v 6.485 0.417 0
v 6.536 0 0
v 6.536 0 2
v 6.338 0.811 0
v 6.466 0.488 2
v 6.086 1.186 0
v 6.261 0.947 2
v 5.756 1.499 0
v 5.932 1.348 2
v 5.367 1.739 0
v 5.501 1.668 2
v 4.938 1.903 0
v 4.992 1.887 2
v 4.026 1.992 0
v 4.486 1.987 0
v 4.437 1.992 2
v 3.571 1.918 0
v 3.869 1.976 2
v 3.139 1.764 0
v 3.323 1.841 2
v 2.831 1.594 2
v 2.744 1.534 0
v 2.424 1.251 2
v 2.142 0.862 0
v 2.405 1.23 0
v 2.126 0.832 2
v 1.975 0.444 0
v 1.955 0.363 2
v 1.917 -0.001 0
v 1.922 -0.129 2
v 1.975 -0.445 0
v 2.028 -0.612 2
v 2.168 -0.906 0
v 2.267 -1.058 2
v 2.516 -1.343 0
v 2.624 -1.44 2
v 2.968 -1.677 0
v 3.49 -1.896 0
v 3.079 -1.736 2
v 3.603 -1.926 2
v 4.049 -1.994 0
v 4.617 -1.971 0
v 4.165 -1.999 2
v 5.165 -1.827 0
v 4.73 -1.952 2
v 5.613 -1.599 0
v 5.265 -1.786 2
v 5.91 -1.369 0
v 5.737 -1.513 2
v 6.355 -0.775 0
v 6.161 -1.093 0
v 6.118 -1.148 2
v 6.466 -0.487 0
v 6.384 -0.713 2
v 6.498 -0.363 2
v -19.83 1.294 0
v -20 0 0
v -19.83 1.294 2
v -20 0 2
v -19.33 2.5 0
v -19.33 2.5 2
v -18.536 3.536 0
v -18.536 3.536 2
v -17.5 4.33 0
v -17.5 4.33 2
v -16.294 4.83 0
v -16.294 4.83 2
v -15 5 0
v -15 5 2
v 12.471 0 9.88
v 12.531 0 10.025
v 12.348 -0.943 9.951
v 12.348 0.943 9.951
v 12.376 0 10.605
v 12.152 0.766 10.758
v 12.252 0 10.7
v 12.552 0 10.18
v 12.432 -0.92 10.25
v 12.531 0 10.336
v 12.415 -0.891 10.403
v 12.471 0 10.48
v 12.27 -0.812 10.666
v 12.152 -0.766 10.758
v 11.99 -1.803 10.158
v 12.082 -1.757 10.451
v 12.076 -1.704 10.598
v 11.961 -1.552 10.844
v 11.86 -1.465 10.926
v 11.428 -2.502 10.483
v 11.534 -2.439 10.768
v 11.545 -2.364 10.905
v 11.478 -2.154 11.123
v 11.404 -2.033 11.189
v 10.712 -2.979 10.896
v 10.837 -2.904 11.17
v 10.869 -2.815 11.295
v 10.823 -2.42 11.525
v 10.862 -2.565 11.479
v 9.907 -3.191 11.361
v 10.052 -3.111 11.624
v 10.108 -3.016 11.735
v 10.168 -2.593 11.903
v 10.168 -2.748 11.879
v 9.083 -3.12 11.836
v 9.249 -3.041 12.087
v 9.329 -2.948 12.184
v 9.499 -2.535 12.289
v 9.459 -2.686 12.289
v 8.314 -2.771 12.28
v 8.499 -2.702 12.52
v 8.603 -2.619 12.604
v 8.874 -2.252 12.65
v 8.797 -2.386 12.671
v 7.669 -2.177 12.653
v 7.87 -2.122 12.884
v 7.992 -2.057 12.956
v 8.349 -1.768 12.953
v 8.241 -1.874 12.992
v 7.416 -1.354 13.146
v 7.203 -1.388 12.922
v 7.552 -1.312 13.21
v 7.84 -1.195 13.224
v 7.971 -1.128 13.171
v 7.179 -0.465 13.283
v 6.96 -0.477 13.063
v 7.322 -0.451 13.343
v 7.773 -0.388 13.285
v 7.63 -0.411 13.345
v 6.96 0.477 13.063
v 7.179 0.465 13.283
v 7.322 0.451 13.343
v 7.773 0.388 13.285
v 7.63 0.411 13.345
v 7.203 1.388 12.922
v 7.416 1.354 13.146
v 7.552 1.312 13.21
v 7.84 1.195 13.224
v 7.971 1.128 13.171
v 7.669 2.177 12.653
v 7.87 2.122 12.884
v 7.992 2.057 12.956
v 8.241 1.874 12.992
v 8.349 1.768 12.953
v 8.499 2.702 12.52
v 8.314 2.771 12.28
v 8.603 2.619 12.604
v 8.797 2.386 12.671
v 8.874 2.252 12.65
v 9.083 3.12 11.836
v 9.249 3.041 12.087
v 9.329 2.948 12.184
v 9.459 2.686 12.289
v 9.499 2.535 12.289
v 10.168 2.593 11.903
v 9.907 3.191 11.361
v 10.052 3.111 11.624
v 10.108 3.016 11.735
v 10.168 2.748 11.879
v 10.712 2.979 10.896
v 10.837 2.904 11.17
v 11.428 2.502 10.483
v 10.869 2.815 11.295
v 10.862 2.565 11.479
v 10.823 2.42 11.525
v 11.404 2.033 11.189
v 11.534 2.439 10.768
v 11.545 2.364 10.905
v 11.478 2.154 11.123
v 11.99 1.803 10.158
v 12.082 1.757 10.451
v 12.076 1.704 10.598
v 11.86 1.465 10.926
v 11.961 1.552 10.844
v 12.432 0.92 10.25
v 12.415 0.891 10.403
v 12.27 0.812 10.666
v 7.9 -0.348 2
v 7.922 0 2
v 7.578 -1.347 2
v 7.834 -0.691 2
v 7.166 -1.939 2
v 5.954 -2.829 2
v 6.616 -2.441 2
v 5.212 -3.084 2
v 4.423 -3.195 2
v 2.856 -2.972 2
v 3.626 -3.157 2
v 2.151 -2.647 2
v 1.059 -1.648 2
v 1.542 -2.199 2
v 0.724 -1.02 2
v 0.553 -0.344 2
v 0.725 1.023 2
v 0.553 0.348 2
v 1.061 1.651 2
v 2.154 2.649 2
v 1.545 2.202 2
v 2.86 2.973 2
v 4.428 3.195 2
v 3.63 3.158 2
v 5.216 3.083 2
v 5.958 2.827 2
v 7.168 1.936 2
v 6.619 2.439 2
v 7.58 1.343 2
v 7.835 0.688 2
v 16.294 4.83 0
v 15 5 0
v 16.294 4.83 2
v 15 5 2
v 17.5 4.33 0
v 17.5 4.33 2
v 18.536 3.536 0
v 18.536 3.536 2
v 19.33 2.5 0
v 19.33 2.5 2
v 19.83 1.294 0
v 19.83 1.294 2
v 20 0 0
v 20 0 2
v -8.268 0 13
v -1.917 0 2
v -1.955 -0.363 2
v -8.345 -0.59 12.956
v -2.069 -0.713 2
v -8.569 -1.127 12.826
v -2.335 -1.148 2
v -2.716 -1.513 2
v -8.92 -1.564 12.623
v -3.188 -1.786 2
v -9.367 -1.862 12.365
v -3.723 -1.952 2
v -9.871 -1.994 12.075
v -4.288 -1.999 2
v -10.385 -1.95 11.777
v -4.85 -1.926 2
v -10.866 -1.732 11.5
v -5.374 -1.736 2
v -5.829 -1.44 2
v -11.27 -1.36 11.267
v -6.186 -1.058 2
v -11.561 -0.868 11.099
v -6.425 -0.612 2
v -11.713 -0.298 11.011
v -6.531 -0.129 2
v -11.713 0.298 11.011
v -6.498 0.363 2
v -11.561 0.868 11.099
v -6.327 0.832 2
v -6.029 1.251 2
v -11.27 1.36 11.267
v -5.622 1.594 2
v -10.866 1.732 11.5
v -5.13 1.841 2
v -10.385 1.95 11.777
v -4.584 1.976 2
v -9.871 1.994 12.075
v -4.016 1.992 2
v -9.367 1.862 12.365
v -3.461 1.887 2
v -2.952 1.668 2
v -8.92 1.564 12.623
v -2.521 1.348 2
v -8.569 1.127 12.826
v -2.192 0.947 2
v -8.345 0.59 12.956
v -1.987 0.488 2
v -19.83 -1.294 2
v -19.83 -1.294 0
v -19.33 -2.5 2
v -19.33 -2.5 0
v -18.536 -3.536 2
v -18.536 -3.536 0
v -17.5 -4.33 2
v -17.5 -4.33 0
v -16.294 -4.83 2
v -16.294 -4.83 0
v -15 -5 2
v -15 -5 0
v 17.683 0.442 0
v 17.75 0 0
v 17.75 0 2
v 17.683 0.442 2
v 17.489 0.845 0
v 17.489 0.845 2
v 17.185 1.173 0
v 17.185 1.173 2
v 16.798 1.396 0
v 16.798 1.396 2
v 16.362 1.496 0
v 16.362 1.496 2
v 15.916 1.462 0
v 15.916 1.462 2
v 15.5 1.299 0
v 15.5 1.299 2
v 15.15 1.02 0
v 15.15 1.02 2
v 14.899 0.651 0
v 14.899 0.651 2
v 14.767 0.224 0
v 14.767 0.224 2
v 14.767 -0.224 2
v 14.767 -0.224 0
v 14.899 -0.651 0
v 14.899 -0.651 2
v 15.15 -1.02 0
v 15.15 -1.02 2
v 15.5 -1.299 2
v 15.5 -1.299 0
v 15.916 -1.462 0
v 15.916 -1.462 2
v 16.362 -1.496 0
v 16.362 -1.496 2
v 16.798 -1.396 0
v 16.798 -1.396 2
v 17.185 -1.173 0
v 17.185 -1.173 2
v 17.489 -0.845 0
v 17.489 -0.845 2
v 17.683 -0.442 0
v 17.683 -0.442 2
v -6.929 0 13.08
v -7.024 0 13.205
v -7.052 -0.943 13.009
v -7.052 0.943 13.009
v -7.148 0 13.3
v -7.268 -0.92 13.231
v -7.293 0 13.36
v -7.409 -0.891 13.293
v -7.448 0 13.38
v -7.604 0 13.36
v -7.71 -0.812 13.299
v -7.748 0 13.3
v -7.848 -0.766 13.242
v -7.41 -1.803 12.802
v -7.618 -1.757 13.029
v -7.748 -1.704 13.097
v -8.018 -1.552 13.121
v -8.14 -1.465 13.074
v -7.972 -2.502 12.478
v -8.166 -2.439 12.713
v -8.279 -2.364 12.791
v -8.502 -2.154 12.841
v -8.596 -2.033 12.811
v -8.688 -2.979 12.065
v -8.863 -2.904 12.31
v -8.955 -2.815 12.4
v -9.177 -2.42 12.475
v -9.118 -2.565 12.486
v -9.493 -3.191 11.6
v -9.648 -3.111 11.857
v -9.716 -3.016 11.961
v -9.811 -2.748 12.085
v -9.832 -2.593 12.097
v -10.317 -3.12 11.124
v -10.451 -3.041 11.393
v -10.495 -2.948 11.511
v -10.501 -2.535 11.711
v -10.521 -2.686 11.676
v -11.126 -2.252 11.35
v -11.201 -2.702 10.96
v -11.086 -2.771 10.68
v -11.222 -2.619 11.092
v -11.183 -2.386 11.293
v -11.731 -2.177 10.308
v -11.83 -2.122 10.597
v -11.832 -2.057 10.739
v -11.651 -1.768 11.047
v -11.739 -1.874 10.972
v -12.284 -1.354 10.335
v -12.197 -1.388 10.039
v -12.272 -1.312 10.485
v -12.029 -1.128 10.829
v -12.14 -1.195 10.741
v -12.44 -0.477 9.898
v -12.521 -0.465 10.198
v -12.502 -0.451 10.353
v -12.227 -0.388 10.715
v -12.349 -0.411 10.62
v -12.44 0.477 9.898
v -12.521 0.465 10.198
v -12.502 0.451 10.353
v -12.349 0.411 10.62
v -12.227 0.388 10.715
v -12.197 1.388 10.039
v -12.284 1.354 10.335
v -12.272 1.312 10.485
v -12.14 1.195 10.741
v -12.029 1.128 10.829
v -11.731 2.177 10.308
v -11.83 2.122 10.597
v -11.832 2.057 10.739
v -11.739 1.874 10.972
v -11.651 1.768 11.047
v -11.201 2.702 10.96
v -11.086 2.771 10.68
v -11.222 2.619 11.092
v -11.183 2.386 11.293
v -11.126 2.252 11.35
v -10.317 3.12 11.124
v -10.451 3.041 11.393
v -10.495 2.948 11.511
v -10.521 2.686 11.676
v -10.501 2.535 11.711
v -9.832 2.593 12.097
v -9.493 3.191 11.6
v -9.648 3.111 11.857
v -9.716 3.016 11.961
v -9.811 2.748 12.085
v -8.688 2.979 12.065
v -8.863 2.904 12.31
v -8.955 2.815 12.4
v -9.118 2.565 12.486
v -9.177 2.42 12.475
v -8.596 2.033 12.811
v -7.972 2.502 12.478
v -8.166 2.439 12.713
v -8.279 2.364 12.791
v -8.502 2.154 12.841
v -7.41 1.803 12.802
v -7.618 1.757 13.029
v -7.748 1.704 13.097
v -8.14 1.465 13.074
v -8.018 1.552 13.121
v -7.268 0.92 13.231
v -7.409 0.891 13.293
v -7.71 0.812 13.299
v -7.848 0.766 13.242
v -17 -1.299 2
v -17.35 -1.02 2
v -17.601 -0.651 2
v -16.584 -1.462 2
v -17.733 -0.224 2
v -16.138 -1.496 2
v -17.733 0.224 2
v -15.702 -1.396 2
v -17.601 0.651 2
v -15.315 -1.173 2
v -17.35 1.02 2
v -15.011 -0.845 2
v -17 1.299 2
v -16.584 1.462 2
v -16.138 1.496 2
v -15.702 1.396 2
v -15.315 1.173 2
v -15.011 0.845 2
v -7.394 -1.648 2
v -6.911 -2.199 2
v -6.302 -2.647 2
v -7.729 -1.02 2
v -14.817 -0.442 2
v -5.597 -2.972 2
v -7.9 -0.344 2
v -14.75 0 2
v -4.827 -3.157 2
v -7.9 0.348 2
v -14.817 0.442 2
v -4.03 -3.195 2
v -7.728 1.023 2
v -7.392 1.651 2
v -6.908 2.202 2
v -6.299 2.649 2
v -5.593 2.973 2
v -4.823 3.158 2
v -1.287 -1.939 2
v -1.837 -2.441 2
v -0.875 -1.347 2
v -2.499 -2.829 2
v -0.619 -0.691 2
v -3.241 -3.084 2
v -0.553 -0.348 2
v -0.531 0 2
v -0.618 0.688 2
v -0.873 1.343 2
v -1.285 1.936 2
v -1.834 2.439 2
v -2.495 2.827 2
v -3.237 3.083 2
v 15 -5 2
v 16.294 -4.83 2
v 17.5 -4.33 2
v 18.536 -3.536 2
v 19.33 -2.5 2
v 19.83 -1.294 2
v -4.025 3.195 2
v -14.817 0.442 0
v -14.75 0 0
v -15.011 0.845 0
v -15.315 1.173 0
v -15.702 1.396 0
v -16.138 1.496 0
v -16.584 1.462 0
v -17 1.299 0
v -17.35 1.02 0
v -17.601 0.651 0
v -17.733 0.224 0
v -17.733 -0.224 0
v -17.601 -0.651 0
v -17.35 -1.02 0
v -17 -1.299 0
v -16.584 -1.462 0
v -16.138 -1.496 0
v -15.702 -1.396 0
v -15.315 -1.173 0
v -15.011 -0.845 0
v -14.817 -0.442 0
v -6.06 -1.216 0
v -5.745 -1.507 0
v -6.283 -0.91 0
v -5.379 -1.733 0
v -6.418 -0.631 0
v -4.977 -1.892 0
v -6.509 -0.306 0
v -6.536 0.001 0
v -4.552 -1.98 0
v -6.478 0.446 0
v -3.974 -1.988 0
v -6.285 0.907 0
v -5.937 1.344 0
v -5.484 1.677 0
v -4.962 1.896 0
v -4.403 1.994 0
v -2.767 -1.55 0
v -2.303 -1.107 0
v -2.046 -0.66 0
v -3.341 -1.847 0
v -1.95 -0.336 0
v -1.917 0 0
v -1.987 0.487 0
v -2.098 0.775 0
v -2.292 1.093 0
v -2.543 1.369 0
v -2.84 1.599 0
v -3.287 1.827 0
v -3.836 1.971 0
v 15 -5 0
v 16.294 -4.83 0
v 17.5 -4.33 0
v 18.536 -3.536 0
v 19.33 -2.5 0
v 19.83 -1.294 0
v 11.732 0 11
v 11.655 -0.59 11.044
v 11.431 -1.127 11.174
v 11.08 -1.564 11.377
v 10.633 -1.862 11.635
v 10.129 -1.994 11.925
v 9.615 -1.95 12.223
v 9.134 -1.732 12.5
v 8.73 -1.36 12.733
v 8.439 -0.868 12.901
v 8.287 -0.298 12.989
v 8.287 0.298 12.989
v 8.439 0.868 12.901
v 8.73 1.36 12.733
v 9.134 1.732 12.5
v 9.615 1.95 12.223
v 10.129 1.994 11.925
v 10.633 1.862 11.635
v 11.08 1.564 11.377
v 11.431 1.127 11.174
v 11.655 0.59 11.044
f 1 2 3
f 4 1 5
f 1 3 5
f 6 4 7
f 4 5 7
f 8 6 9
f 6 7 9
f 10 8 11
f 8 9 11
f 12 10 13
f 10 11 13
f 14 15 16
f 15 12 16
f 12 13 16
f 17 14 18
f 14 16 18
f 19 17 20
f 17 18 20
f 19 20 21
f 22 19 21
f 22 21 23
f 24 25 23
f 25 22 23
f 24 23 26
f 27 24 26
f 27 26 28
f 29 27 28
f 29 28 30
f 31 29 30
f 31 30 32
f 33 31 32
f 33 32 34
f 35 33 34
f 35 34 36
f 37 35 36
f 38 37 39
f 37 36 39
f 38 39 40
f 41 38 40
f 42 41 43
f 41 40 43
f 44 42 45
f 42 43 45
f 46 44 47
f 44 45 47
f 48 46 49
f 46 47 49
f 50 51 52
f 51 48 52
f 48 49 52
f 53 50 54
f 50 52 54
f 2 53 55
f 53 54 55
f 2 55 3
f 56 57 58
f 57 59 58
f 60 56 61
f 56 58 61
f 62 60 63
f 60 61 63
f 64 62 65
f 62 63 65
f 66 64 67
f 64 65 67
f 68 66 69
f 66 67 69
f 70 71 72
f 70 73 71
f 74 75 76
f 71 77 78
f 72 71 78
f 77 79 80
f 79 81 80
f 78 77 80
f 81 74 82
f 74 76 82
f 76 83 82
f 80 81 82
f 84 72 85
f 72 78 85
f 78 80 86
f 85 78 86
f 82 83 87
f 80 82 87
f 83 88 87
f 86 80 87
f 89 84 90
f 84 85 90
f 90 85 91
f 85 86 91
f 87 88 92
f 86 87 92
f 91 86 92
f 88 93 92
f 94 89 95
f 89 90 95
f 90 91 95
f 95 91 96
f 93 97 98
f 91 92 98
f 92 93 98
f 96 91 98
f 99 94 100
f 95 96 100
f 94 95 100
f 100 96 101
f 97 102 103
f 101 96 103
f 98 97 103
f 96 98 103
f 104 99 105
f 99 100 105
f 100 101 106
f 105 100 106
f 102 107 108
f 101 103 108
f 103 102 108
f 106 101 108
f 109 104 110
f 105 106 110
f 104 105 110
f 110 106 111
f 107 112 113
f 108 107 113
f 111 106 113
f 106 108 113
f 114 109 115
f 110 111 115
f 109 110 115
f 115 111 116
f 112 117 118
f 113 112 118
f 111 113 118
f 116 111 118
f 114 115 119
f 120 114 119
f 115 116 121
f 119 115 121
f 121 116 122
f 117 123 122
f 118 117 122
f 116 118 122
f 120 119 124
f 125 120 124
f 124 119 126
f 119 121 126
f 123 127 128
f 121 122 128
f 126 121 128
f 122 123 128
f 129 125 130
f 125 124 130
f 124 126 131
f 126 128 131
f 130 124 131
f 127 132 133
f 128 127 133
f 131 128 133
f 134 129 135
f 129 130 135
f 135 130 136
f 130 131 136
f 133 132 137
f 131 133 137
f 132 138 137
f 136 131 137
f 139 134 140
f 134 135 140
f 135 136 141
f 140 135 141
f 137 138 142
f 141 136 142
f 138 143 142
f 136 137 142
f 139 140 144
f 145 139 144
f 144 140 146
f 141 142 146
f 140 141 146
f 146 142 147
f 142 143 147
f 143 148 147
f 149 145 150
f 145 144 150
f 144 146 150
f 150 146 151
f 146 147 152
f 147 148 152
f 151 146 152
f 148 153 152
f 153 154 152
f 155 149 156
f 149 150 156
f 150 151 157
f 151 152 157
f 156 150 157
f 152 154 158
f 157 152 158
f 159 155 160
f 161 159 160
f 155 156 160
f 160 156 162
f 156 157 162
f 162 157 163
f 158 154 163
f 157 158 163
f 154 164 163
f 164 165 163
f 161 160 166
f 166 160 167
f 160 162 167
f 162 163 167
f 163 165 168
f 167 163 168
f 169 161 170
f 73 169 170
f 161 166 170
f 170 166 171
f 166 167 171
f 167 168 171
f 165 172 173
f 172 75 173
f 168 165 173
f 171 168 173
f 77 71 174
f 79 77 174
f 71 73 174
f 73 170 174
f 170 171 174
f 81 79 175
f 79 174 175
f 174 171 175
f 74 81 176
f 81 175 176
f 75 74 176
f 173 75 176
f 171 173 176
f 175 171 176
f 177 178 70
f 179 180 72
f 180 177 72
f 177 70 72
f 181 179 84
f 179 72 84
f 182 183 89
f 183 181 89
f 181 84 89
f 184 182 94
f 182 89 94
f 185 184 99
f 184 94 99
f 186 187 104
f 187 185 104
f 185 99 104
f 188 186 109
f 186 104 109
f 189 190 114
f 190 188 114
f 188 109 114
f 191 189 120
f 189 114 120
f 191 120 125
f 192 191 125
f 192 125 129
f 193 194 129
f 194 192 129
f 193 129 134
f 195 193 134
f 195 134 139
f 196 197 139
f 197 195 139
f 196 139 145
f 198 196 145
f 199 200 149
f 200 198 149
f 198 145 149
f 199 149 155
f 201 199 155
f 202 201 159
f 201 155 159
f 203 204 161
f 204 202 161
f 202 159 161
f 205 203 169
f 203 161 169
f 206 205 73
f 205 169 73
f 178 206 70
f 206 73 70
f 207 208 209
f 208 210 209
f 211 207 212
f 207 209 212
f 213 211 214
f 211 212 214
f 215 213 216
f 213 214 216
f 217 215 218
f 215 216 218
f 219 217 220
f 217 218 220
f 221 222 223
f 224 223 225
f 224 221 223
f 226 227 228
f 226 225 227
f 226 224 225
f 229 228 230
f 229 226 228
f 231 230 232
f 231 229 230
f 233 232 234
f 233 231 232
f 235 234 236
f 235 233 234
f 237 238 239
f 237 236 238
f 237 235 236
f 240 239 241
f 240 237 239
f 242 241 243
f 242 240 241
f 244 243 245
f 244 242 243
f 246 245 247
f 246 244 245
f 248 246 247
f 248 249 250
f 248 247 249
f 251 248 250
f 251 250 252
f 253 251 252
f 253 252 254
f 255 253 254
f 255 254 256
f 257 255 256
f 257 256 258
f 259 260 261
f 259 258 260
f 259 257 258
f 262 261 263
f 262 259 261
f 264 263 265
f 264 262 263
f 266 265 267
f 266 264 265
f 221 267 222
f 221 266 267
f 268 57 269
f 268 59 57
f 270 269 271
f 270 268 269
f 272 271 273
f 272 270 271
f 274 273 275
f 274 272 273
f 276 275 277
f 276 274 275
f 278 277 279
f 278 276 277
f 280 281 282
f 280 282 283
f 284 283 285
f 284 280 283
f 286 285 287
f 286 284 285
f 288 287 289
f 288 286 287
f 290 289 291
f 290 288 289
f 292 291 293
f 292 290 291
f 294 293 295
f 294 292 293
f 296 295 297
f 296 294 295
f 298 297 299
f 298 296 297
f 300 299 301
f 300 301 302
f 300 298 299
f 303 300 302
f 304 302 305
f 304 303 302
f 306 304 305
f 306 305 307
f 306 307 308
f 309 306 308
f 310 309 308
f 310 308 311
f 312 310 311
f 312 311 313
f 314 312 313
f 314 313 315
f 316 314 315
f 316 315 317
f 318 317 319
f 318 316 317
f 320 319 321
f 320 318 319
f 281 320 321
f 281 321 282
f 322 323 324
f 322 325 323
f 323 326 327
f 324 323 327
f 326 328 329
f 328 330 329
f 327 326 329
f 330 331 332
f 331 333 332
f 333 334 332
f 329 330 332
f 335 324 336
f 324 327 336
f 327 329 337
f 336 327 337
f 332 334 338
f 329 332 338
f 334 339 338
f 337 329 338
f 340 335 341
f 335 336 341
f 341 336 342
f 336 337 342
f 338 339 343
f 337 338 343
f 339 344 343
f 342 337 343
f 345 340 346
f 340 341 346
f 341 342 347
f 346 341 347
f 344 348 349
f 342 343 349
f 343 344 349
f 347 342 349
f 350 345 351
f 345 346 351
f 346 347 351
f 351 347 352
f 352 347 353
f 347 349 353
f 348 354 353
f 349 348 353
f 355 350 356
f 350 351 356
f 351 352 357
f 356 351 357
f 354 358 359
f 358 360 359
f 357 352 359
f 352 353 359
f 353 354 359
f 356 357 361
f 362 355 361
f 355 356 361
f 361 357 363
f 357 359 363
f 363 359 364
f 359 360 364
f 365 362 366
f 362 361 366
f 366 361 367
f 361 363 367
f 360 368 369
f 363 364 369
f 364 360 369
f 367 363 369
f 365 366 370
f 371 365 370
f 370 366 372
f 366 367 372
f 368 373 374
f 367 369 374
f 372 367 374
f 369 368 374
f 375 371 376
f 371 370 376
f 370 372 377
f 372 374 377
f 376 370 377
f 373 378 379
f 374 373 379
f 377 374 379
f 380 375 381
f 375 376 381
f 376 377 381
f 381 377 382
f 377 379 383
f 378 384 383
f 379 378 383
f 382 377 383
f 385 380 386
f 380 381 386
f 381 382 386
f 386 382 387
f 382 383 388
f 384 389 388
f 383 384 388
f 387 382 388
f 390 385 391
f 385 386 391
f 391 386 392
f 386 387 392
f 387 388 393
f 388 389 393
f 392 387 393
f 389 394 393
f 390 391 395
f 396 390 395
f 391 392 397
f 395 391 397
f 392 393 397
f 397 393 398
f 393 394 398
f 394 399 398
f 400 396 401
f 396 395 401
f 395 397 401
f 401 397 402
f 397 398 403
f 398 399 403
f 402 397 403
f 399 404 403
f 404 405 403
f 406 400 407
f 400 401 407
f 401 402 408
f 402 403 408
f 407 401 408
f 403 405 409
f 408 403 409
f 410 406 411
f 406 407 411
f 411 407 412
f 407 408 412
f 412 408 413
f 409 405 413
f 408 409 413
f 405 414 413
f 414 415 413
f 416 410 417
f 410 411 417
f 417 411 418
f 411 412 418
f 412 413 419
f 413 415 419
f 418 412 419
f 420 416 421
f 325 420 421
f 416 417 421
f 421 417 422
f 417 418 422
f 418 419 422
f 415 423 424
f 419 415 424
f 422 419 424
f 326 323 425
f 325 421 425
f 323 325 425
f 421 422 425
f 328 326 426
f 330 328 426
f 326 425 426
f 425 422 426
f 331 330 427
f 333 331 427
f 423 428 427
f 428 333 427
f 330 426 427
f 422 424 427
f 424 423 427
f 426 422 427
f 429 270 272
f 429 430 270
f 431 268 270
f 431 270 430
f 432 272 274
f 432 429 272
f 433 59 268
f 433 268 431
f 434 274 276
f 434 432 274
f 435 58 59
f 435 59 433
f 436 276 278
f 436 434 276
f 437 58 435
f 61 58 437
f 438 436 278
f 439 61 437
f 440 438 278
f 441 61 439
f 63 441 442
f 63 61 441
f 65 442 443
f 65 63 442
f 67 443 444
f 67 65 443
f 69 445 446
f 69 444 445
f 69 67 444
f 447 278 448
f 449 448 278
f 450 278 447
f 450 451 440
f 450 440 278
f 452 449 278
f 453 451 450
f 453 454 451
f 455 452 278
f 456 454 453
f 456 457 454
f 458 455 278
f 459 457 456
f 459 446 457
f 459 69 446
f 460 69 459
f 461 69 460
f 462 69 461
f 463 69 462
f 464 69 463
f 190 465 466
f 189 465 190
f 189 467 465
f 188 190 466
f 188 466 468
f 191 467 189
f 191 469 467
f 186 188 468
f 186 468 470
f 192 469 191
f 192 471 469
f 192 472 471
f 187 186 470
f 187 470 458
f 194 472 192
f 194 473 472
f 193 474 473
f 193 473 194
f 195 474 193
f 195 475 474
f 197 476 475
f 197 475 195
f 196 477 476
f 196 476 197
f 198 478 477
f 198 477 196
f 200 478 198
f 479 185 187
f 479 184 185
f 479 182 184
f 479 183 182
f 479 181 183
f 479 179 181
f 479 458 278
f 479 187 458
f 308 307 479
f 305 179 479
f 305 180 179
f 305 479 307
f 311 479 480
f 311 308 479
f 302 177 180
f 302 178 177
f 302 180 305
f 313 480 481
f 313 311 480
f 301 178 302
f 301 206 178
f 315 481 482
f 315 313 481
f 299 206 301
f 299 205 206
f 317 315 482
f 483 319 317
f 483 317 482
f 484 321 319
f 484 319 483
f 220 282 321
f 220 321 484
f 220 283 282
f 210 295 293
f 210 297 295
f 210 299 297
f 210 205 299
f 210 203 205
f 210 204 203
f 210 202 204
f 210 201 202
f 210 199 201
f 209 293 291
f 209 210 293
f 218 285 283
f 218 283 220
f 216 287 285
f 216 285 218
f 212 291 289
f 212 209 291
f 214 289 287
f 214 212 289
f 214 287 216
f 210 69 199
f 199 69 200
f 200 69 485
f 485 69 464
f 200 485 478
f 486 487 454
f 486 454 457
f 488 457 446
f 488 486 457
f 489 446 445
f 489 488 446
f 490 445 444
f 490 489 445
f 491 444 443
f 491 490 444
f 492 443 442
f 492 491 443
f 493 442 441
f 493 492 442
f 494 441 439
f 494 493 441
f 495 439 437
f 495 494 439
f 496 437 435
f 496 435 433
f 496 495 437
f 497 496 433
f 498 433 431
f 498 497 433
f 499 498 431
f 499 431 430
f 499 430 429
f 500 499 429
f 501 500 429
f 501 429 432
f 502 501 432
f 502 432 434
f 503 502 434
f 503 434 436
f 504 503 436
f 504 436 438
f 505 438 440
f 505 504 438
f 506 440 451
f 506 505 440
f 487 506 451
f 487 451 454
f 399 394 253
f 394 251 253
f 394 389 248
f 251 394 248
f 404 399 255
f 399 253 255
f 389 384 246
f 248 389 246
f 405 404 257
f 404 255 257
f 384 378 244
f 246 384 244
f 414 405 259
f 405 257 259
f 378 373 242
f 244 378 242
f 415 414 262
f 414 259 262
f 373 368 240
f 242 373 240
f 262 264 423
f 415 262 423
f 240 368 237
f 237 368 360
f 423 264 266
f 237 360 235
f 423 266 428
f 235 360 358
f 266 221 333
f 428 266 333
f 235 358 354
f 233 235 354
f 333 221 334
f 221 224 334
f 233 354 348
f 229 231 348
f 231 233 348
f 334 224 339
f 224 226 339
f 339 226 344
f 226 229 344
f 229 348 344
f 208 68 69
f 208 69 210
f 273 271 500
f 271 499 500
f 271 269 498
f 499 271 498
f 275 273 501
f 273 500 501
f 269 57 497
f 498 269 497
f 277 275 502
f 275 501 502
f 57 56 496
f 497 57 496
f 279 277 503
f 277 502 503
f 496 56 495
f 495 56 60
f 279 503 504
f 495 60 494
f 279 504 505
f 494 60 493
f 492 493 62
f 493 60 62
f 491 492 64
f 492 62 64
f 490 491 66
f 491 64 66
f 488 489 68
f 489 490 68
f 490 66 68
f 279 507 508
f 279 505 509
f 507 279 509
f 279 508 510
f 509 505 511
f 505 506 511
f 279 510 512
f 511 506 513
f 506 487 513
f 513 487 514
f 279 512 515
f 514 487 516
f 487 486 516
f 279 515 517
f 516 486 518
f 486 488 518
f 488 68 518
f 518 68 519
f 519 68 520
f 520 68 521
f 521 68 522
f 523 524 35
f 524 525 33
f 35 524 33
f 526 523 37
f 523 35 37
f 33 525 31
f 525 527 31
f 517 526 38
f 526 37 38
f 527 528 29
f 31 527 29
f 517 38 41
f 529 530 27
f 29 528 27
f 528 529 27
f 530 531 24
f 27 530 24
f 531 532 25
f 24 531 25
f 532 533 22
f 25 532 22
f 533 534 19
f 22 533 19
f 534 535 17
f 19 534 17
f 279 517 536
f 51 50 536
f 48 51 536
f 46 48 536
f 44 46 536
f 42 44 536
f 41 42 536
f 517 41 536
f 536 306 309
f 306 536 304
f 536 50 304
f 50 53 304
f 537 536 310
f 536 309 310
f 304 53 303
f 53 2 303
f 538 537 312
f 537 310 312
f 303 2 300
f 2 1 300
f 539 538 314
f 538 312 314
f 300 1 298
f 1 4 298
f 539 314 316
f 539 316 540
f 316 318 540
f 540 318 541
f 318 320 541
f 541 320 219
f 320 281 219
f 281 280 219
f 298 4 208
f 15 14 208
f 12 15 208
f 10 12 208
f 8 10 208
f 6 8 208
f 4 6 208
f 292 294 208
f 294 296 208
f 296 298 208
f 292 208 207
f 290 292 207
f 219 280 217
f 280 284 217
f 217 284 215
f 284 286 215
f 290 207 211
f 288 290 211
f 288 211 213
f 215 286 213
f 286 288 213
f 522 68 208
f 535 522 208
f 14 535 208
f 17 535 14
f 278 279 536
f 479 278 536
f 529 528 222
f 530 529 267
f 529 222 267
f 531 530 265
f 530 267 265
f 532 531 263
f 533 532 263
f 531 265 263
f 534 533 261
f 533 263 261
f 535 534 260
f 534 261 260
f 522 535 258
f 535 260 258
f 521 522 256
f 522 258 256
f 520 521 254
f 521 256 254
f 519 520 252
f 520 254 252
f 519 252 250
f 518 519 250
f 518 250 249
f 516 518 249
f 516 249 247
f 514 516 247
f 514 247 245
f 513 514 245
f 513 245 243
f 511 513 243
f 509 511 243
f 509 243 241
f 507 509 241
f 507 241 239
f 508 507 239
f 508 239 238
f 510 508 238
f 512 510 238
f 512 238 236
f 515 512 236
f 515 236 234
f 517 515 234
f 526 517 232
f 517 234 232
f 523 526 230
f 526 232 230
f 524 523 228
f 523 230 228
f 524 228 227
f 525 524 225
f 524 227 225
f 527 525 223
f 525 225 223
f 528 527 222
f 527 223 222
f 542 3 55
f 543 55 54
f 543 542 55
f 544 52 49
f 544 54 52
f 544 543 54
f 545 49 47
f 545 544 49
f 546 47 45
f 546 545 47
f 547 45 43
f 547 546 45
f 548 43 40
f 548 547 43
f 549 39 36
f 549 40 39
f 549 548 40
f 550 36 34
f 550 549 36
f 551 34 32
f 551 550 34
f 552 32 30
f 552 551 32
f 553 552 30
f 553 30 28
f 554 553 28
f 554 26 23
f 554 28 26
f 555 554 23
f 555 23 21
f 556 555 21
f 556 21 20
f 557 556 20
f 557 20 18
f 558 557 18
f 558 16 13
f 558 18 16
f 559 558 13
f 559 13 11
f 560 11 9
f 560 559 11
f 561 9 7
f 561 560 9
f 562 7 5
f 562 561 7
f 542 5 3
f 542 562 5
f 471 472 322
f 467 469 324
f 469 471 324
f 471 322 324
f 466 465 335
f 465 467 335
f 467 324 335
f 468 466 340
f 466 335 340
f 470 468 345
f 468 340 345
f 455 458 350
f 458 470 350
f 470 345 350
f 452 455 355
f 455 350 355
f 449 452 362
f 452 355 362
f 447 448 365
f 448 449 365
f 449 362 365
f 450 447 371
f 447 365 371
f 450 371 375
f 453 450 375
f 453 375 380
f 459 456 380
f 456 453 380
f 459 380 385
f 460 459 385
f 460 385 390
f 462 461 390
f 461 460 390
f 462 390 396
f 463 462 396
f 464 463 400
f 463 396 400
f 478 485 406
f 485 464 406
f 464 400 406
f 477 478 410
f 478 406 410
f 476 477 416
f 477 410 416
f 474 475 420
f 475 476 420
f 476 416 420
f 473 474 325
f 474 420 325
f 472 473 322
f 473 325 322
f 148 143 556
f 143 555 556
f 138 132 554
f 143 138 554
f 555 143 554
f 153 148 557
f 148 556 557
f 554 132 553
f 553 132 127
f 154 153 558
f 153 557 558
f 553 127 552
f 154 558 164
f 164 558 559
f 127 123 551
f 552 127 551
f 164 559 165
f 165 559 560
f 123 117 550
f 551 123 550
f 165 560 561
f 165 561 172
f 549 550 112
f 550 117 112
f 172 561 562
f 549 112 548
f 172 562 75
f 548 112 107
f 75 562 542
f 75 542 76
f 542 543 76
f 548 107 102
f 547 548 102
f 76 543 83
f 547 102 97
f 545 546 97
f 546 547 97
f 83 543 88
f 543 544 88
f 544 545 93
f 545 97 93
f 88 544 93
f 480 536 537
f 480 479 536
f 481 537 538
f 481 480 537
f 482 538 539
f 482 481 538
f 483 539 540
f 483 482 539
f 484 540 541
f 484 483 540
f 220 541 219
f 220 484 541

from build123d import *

# Parameters (mm, degrees)
F0_W      = 40
F0_H      = 10
F0_R      = 1.5
F1_DEPTH  = 2
F7_R      = 3.2
F7_R_2    = 2
F9_R      = 3.2
F9_R_2    = 2
F11_R     = 4.99999
F12_DEPTH = 2.001
F13_DEPTH = 2.0010001
F14_R     = 0.6


# Not quite as in the source:
# - a fillet or chamfer is up to 0.001 mm smaller than in the source, because OpenCascade refuses the exact size


with BuildPart() as f1:
    # F0 (on Top) → F1 (new body)
    with BuildSketch(Plane.XY):
        Rectangle(F0_W, F0_H)
        with Locations((-16.25, 0)):
            Circle(F0_R, mode=Mode.SUBTRACT)
        with Locations((16.25, 0)):
            Circle(F0_R, mode=Mode.SUBTRACT)
    extrude(amount=F1_DEPTH)

    # F7 (on line) → F8 (join, up to the next surface of F1)
    with BuildSketch(Plane(origin=(7.6961524227, 0, 13.3301270189), x_dir=(0.8660254038, 0, -0.5), z_dir=(-0.5, 0, -0.8660254038))):
        with Locations((2.6602540378, 0)):
            Circle(F7_R)
        with Locations((2.6602540378, 0)):
            Circle(F7_R_2, mode=Mode.SUBTRACT)
    extrude(until=Until.NEXT)

    # F9 (on line) → F10 (join, up to the next surface of F1)
    with BuildSketch(Plane(origin=(-7.6961524227, 0, 13.3301270189), x_dir=(0.8660254038, 0, 0.5), z_dir=(0.5, 0, -0.8660254038))):
        with Locations((-2.6602540378, 0)):
            Circle(F9_R)
        with Locations((-2.6602540378, 0)):
            Circle(F9_R_2, mode=Mode.SUBTRACT)
    extrude(until=Until.NEXT)

    # F11 (radius 5 in the source; OpenCascade refuses exactly that, so slightly less here)
    f11_edges = [f1.edges().sort_by_distance(p)[0] for p in [
        (-20, -5, 1),
        (20, -5, 1),
        (20, 5, 1),
        (-20, 5, 1),
    ]]
    fillet(f11_edges, radius=F11_R)

    # F12 (cut, through all): a face of the model
    f12_faces = [f1.faces().sort_by_distance(p)[0] for p in [
        (-4.2264973081, 0, 2),
    ]]
    extrude(f12_faces, amount=-F12_DEPTH, mode=Mode.SUBTRACT)

    # F13 (cut, through all): a face of the model
    f13_faces = [f1.faces().sort_by_distance(p)[0] for p in [
        (4.2264973081, 0, 2),
    ]]
    extrude(f13_faces, amount=-F13_DEPTH, mode=Mode.SUBTRACT)

    # F14
    f14_edges = [f1.edges().sort_by_distance(p)[0] for p in [
        (-12.771281, 0, 10.4),
        (7.228719, 0, 13.6),
    ]]
    fillet(f14_edges, radius=F14_R)


solid = f1.part
